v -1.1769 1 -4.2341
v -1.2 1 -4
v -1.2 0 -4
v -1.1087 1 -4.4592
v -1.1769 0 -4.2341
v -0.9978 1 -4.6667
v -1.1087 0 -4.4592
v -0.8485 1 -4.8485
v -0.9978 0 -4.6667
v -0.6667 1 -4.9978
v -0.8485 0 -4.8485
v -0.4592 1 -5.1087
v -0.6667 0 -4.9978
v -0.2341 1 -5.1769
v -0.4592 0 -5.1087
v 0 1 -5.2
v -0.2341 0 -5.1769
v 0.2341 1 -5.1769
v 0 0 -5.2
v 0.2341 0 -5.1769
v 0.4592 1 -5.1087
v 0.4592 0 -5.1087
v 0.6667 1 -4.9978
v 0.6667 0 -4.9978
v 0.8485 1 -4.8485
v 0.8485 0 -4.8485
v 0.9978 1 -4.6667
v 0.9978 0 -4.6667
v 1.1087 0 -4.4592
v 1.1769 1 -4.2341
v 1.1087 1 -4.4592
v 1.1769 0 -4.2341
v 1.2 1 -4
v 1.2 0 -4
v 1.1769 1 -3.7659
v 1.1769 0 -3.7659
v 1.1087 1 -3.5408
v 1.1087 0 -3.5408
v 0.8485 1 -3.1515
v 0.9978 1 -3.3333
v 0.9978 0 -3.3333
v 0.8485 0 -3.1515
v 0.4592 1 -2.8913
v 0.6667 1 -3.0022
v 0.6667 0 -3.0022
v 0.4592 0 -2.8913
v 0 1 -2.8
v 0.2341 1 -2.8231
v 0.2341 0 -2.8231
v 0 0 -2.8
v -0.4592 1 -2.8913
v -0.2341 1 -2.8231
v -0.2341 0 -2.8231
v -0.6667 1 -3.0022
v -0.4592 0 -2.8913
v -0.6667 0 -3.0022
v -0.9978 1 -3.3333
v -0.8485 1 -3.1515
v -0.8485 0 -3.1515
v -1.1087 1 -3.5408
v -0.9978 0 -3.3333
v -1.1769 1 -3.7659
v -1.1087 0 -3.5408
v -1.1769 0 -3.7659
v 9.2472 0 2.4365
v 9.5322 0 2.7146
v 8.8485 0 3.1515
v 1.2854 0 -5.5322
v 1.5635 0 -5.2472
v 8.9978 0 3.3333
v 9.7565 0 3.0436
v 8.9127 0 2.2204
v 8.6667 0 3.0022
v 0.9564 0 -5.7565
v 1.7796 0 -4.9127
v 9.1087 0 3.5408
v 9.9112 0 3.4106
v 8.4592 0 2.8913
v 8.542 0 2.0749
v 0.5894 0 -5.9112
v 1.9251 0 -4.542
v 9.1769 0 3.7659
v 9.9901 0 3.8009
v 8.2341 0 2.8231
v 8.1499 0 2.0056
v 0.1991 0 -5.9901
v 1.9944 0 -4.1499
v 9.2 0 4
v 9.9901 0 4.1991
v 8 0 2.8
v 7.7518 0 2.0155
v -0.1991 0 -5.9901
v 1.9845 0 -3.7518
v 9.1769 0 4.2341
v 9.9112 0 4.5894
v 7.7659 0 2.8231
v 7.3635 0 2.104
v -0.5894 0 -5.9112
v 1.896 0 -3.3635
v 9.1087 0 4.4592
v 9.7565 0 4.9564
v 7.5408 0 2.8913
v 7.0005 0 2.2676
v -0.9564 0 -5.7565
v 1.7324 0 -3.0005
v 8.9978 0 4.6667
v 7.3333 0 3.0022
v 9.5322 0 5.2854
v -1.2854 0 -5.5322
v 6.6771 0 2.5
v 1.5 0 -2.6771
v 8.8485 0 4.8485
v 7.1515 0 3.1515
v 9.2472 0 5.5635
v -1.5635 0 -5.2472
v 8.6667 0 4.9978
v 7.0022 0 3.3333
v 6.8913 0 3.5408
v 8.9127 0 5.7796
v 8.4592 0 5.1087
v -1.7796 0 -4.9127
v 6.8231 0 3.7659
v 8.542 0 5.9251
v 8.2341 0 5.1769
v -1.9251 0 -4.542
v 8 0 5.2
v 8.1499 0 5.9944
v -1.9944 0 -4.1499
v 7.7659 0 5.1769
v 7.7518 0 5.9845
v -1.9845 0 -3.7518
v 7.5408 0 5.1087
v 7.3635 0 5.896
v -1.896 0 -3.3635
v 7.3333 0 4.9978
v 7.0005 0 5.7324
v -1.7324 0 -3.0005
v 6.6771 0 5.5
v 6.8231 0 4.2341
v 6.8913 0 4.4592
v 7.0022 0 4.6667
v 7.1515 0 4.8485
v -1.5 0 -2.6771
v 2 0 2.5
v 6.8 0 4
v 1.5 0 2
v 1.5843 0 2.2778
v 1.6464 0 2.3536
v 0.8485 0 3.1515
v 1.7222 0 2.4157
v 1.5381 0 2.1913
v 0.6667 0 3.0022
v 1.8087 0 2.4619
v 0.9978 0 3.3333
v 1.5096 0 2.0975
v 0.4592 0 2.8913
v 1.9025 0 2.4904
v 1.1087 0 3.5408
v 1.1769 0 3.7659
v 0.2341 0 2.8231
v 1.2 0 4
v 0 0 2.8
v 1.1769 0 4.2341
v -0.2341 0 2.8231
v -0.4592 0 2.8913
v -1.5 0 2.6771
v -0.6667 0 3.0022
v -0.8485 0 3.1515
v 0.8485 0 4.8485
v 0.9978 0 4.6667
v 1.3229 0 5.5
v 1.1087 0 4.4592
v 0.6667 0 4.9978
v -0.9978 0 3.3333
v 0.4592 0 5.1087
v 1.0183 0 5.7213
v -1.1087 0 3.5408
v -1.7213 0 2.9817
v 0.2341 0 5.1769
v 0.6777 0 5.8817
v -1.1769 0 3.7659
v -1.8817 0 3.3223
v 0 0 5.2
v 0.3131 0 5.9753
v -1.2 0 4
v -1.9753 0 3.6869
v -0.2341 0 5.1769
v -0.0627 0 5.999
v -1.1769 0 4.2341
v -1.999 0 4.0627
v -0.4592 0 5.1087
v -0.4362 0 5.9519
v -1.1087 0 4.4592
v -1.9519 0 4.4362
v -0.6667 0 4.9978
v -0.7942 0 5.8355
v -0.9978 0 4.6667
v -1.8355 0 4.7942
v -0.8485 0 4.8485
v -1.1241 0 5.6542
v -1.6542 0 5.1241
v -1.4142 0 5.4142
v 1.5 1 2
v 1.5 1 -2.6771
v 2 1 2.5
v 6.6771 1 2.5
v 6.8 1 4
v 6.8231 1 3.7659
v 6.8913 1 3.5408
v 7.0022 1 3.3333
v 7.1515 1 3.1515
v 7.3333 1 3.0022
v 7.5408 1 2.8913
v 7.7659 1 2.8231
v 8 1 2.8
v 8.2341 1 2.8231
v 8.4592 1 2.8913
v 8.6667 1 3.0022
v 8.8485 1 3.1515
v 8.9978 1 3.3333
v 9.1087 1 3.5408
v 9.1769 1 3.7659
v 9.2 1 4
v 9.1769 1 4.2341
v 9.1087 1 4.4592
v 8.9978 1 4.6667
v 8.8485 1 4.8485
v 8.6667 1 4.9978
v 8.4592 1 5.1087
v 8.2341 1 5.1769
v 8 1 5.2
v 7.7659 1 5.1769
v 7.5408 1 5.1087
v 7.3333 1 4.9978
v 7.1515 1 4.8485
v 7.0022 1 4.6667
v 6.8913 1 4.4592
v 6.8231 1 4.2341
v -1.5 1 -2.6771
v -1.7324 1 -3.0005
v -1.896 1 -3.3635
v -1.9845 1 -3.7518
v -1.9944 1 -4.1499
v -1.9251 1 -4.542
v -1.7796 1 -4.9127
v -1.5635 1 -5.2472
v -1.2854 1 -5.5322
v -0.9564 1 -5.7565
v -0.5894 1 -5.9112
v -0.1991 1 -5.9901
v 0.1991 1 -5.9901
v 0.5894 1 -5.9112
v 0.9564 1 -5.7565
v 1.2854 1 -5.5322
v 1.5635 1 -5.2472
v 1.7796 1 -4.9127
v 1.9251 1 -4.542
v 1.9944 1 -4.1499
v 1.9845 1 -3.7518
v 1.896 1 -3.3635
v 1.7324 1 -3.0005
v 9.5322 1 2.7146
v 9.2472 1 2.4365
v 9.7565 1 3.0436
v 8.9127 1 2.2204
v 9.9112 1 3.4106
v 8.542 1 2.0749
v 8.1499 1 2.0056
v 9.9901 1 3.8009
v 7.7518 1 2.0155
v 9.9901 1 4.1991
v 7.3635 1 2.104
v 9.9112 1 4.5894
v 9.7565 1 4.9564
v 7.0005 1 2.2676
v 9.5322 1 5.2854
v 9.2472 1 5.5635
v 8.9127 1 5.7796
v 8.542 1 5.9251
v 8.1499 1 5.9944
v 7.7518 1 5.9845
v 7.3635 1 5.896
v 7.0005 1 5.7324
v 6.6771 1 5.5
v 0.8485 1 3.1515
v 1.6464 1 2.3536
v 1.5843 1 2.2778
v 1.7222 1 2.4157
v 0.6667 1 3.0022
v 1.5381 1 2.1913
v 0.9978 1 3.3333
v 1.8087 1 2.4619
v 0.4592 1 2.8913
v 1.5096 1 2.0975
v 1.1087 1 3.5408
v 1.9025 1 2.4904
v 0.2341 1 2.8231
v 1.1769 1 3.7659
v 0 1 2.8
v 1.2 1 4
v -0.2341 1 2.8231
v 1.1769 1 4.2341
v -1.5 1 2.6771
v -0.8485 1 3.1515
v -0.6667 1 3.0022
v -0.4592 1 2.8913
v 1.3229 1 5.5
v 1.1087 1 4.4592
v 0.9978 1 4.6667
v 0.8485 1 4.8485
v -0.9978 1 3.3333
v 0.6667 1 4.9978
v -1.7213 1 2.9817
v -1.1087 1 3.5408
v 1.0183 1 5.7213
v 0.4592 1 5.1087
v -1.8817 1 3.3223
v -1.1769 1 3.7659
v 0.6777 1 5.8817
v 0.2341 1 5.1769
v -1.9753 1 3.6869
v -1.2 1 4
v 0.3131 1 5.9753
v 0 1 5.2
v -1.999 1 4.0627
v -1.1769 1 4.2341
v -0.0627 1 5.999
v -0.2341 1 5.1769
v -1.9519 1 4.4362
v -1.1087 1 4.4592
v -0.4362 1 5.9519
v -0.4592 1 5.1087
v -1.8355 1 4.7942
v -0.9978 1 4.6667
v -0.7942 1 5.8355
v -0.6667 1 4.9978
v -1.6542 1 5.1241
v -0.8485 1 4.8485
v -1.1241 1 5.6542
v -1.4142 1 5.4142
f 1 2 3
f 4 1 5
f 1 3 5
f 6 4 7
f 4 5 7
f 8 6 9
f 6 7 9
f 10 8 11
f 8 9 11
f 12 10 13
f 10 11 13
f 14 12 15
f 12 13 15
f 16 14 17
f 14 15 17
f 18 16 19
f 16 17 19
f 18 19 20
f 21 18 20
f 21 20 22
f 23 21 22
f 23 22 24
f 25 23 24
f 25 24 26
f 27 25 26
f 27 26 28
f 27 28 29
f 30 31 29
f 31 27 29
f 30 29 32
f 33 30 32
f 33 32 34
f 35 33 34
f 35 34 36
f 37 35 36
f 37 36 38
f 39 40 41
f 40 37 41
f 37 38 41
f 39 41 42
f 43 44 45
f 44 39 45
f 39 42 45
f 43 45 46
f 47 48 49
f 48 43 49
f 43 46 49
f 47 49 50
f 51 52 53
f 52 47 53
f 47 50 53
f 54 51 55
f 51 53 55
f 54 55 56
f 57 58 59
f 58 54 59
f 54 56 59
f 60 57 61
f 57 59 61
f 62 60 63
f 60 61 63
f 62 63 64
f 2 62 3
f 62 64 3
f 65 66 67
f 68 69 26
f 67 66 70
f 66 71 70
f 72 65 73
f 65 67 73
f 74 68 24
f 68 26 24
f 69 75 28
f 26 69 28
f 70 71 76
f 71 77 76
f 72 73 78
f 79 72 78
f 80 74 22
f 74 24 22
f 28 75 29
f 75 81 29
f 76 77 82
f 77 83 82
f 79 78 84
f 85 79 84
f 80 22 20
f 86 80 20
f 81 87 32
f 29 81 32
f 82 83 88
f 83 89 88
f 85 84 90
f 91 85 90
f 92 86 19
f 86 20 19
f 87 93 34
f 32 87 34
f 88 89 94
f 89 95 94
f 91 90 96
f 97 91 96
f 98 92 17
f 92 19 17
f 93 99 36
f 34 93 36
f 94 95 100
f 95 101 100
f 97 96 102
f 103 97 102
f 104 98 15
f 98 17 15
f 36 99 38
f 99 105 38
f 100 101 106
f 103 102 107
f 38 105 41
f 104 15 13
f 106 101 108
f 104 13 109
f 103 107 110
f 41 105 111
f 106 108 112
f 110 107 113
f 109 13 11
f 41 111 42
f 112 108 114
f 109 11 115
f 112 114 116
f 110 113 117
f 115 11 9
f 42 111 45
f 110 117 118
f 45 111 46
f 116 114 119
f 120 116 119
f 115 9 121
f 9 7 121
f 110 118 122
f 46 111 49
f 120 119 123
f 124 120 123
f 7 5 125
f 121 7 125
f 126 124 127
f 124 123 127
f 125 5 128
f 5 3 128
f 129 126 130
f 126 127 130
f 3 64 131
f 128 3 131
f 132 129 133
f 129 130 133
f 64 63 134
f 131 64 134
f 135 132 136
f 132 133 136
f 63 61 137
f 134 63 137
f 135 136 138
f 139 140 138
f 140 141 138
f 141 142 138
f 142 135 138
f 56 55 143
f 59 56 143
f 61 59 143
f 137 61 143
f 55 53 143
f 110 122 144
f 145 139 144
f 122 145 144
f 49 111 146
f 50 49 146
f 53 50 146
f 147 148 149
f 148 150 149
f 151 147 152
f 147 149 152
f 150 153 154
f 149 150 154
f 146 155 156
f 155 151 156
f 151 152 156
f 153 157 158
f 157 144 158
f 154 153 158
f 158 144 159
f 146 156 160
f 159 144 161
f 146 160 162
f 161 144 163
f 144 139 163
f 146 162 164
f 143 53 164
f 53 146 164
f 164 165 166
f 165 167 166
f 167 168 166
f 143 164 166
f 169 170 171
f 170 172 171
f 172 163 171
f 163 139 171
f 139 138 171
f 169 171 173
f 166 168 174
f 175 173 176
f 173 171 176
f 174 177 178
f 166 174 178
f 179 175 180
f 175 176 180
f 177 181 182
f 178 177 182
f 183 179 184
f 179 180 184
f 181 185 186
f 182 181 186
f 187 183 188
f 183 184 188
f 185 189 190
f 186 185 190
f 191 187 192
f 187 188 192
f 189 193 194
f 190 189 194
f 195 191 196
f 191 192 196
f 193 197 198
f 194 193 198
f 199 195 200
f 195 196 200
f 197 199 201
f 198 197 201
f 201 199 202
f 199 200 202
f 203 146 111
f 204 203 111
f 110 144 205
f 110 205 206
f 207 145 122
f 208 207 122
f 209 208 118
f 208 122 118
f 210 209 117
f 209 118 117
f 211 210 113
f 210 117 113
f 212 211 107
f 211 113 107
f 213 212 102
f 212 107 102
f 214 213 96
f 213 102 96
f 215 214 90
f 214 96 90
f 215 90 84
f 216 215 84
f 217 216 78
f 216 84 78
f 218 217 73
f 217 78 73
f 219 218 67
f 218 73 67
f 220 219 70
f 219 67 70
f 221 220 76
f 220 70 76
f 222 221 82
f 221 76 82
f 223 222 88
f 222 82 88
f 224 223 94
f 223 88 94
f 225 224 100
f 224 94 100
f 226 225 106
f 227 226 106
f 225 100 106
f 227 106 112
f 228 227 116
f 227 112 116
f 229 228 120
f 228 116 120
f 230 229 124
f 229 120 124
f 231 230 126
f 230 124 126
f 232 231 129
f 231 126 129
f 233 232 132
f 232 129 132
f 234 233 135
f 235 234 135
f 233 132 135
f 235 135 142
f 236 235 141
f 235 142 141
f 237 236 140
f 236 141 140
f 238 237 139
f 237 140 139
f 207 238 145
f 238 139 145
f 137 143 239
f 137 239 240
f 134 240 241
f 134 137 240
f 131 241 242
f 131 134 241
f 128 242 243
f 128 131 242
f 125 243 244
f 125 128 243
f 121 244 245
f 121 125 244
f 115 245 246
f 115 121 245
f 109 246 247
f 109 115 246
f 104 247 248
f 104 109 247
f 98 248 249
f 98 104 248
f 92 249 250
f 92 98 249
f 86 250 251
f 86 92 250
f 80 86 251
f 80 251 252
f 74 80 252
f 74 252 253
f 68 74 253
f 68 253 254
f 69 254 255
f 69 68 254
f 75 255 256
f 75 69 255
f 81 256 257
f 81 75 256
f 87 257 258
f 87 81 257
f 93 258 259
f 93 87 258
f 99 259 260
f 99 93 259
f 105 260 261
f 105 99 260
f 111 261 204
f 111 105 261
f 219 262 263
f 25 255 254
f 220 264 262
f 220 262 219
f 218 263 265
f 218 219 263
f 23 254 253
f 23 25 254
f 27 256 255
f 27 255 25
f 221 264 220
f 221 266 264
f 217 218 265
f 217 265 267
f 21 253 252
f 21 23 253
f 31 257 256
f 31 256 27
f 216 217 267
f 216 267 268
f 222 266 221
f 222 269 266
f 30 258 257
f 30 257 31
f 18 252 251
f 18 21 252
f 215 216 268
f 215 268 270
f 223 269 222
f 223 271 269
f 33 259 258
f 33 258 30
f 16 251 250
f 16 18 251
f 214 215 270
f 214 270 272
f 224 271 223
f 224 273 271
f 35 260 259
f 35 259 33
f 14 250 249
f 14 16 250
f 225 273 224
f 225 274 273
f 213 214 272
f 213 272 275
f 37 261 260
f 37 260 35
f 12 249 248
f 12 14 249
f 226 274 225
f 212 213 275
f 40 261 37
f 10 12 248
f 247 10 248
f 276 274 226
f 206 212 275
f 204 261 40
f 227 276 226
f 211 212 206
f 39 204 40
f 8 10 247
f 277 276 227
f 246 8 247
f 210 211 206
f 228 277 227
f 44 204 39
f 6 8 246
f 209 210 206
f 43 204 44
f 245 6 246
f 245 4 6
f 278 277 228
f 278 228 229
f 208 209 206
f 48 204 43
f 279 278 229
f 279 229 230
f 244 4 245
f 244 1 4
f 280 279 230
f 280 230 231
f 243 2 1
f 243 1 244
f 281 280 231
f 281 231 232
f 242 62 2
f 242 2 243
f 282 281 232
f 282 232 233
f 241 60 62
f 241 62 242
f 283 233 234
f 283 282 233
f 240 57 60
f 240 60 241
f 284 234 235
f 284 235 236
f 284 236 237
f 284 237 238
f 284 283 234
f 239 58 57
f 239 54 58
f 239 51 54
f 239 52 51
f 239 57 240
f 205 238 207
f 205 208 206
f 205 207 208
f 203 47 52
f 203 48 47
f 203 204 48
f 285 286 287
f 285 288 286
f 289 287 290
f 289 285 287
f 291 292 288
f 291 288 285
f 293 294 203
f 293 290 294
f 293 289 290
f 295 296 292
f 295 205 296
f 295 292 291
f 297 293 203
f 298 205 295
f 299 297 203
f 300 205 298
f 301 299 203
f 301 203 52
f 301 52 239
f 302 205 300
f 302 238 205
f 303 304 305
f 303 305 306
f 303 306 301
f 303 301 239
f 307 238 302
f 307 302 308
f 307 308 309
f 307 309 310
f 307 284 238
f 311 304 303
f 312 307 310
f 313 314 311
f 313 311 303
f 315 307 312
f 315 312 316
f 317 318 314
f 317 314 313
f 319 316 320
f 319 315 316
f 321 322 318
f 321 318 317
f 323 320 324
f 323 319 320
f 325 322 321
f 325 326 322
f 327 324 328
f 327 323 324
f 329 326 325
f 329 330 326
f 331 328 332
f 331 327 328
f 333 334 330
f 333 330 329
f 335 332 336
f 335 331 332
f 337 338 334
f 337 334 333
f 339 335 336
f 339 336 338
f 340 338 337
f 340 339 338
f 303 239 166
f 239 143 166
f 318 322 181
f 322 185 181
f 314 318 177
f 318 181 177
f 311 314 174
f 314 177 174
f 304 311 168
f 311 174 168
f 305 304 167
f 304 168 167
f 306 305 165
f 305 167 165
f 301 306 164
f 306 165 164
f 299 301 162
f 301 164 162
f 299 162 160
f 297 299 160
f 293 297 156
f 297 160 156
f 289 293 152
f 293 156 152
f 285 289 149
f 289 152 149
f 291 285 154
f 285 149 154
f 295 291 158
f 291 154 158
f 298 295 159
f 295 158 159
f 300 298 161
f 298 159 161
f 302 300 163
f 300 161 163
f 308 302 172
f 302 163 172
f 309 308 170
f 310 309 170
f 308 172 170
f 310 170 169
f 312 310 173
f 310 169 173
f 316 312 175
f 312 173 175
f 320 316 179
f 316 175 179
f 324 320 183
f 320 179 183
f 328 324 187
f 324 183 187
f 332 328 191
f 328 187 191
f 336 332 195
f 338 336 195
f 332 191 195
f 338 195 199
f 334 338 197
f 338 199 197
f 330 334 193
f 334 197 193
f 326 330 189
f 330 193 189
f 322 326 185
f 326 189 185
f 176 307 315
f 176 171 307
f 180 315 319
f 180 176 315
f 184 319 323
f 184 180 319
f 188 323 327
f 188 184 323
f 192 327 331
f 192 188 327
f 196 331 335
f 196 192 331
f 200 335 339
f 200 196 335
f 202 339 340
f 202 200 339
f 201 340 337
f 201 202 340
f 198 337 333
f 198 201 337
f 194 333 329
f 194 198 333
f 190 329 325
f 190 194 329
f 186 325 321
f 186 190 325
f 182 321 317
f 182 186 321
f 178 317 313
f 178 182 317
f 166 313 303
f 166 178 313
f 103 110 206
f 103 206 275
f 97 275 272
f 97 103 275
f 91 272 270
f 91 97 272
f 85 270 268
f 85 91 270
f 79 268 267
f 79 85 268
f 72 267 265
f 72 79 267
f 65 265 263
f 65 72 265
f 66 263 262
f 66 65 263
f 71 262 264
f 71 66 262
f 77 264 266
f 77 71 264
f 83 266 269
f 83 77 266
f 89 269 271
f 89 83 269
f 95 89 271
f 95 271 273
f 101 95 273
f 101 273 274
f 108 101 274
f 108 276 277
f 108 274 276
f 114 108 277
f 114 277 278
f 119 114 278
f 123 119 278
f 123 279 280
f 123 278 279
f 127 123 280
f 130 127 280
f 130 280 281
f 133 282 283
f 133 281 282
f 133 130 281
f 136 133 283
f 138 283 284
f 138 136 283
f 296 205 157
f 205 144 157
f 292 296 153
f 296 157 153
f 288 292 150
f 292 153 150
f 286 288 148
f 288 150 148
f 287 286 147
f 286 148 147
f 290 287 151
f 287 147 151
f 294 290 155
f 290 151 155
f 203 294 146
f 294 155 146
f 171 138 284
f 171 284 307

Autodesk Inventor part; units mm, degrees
ref_plane "YZ Plane" through (0, 0, 0) normal (1, 0, 0) x (0, 1, 0)
ref_plane "XZ Plane" through (0, 0, 0) normal (0, 1, 0) x (-1, 0, 0)
ref_plane "XY Plane" through (0, 0, 0) normal (0, 0, 1) x (1, 0, 0)
sketch "Sketch1" plane through (0, 0, 0) normal (0, 1, 0) x (-1, 0, 0)
  line L0 (-1.5, -4) -> (1.5, -4)
  line L1 (1.5, -4) -> (1.5, 4)
  line L2 (1.5, 4) -> (-1.5, 4)
  line L3 (-1.5, 2) -> (-1.5, -4)
  line L4 (-1.5, -4) -> (1.5, 4) construction
  line L5 (1.5, -4) -> (-1.5, 4) construction
  circle A0 centre (0, 4) radius 1.2
  circle A1 centre (0, -4) radius 1.2
  circle A2 centre (0, -4) radius 2
  circle A3 centre (0, 4) radius 2
  line L6 (-2, 2.5) -> (-8, 2.5)
  line L7 (-8, 2.5) -> (-8, 5.5)
  line L8 (-8, 5.5) -> (0, 5.5)
  line L9 (0, 5.5) -> (0, 2.5)
  circle A4 centre (-8, 4) radius 1.2
  circle A5 centre (-8, 4) radius 2
  arc A6 (-1.5, 2) -> (-2, 2.5) centre (-2, 2) ccw
  point P0 (0, 0)
  point P1 (-1.5, -2.6771)
  point P2 (1.5, -2.6771)
  point P3 (1.5, 2.6771)
  point P4 (-1.5, 2.6771)
  point P5 (-6.6771, 2.5)
  point P6 (-1.5, 2.5)
  point P7 (-1.3229, 5.5)
  point P8 (-6.6771, 5.5)
  point P9 (-8, 5.2)
  point P10 (-8, 2.8)
  dimension "d0" = 3
  dimension "linkPitchLength" = 8
  dimension "d3" = 2.4
  dimension "d4" = 4
  dimension "linkPitchWidth" = 8
  dimension "d17" = 0.5
extrude "Extrusion1" add sketch "Sketch1" along normal blind 1 contours A1 L0 L3 A2 L1 | L0 L1 A2 L3 A1 | A2 L3 A6 L6 A5 L8 A3 L1 | A3 L8 L9 A0 L2 L1 | L1 L2 A0 L9 L8 A3 | A5 L6 L7 A4 L8 | L8 L7 A4 L6 A5
sketch "Sketch2" plane through (0, 1, 0) normal (0, 1, 0) x (1, 0, 0)
  line L0 (6.6771, -2.5) -> (2, -2.5) projected
  arc A0 (1.5, -2) -> (2, -2.5) centre (2, -2) ccw projected
  line L1 (1.5, -2) -> (1.5, 2.6771) projected
  arc A1 (1.5, 2.6771) -> (-1.5, 2.6771) centre (0, 4) ccw projected
  line L2 (-1.5, 2.6771) -> (-1.5, -2.6771) projected
  arc A2 (-1.5, -2.6771) -> (1.3229, -5.5) centre (0, -4) ccw projected
  line L3 (1.3229, -5.5) -> (6.6771, -5.5) projected
  arc A3 (6.6771, -5.5) -> (6.6771, -2.5) centre (8, -4) ccw projected
  circle A4 centre (8, -4) radius 1.2 projected
  circle A5 centre (0, 4) radius 1.2 projected
  circle A6 centre (0, -4) radius 1.2 projected
  point P0 (0, 0)
extrude "Extrusion2" [suppressed]
sketch "Sketch5" plane through (0, 1, 0) normal (0, 1, 0) x (1, 0, 0)
  line L0 (6.6771, -2.5) -> (2, -2.5) projected
  arc A0 (1.5, -2) -> (2, -2.5) centre (2, -2) ccw projected
  line L1 (1.5, -2) -> (1.5, 2.6771) projected
  arc A1 (1.5, 2.6771) -> (-1.5, 2.6771) centre (0, 4) ccw projected
  line L2 (-1.5, 2.6771) -> (-1.5, -2.6771) projected
  arc A2 (-1.5, -2.6771) -> (1.3229, -5.5) centre (0, -4) ccw projected
  line L3 (1.3229, -5.5) -> (6.6771, -5.5) projected
  arc A3 (6.6771, -5.5) -> (6.6771, -2.5) centre (8, -4) ccw projected
  circle A4 centre (8, -4) radius 1.2 projected
  circle A5 centre (0, 4) radius 1.2 projected
  circle A6 centre (0, -4) radius 1.2 projected
  point P0 (0, 0)
extrude "Extrusion3" [suppressed]
sketch "Sketch6" plane through (0, 1, 0) normal (0, 1, 0) x (1, 0, 0)
  line L0 (6.6771, -2.5) -> (2, -2.5) projected
  arc A0 (1.5, -2) -> (2, -2.5) centre (2, -2) ccw projected
  line L1 (1.5, -2) -> (1.5, 2.6771) projected
  arc A1 (1.5, 2.6771) -> (-1.5, 2.6771) centre (0, 4) ccw projected
  line L2 (-1.5, 2.6771) -> (-1.5, -2.6771) projected
  arc A2 (-1.5, -2.6771) -> (1.3229, -5.5) centre (0, -4) ccw projected
  line L3 (1.3229, -5.5) -> (6.6771, -5.5) projected
  arc A3 (6.6771, -5.5) -> (6.6771, -2.5) centre (8, -4) ccw projected
  circle A4 centre (8, -4) radius 1.2 projected
  circle A5 centre (0, 4) radius 1.2 projected
  circle A6 centre (0, -4) radius 1.2 projected
  point P0 (0, 0)
extrude "Extrusion4" [suppressed]
properties part number "link-1-turn-8"
